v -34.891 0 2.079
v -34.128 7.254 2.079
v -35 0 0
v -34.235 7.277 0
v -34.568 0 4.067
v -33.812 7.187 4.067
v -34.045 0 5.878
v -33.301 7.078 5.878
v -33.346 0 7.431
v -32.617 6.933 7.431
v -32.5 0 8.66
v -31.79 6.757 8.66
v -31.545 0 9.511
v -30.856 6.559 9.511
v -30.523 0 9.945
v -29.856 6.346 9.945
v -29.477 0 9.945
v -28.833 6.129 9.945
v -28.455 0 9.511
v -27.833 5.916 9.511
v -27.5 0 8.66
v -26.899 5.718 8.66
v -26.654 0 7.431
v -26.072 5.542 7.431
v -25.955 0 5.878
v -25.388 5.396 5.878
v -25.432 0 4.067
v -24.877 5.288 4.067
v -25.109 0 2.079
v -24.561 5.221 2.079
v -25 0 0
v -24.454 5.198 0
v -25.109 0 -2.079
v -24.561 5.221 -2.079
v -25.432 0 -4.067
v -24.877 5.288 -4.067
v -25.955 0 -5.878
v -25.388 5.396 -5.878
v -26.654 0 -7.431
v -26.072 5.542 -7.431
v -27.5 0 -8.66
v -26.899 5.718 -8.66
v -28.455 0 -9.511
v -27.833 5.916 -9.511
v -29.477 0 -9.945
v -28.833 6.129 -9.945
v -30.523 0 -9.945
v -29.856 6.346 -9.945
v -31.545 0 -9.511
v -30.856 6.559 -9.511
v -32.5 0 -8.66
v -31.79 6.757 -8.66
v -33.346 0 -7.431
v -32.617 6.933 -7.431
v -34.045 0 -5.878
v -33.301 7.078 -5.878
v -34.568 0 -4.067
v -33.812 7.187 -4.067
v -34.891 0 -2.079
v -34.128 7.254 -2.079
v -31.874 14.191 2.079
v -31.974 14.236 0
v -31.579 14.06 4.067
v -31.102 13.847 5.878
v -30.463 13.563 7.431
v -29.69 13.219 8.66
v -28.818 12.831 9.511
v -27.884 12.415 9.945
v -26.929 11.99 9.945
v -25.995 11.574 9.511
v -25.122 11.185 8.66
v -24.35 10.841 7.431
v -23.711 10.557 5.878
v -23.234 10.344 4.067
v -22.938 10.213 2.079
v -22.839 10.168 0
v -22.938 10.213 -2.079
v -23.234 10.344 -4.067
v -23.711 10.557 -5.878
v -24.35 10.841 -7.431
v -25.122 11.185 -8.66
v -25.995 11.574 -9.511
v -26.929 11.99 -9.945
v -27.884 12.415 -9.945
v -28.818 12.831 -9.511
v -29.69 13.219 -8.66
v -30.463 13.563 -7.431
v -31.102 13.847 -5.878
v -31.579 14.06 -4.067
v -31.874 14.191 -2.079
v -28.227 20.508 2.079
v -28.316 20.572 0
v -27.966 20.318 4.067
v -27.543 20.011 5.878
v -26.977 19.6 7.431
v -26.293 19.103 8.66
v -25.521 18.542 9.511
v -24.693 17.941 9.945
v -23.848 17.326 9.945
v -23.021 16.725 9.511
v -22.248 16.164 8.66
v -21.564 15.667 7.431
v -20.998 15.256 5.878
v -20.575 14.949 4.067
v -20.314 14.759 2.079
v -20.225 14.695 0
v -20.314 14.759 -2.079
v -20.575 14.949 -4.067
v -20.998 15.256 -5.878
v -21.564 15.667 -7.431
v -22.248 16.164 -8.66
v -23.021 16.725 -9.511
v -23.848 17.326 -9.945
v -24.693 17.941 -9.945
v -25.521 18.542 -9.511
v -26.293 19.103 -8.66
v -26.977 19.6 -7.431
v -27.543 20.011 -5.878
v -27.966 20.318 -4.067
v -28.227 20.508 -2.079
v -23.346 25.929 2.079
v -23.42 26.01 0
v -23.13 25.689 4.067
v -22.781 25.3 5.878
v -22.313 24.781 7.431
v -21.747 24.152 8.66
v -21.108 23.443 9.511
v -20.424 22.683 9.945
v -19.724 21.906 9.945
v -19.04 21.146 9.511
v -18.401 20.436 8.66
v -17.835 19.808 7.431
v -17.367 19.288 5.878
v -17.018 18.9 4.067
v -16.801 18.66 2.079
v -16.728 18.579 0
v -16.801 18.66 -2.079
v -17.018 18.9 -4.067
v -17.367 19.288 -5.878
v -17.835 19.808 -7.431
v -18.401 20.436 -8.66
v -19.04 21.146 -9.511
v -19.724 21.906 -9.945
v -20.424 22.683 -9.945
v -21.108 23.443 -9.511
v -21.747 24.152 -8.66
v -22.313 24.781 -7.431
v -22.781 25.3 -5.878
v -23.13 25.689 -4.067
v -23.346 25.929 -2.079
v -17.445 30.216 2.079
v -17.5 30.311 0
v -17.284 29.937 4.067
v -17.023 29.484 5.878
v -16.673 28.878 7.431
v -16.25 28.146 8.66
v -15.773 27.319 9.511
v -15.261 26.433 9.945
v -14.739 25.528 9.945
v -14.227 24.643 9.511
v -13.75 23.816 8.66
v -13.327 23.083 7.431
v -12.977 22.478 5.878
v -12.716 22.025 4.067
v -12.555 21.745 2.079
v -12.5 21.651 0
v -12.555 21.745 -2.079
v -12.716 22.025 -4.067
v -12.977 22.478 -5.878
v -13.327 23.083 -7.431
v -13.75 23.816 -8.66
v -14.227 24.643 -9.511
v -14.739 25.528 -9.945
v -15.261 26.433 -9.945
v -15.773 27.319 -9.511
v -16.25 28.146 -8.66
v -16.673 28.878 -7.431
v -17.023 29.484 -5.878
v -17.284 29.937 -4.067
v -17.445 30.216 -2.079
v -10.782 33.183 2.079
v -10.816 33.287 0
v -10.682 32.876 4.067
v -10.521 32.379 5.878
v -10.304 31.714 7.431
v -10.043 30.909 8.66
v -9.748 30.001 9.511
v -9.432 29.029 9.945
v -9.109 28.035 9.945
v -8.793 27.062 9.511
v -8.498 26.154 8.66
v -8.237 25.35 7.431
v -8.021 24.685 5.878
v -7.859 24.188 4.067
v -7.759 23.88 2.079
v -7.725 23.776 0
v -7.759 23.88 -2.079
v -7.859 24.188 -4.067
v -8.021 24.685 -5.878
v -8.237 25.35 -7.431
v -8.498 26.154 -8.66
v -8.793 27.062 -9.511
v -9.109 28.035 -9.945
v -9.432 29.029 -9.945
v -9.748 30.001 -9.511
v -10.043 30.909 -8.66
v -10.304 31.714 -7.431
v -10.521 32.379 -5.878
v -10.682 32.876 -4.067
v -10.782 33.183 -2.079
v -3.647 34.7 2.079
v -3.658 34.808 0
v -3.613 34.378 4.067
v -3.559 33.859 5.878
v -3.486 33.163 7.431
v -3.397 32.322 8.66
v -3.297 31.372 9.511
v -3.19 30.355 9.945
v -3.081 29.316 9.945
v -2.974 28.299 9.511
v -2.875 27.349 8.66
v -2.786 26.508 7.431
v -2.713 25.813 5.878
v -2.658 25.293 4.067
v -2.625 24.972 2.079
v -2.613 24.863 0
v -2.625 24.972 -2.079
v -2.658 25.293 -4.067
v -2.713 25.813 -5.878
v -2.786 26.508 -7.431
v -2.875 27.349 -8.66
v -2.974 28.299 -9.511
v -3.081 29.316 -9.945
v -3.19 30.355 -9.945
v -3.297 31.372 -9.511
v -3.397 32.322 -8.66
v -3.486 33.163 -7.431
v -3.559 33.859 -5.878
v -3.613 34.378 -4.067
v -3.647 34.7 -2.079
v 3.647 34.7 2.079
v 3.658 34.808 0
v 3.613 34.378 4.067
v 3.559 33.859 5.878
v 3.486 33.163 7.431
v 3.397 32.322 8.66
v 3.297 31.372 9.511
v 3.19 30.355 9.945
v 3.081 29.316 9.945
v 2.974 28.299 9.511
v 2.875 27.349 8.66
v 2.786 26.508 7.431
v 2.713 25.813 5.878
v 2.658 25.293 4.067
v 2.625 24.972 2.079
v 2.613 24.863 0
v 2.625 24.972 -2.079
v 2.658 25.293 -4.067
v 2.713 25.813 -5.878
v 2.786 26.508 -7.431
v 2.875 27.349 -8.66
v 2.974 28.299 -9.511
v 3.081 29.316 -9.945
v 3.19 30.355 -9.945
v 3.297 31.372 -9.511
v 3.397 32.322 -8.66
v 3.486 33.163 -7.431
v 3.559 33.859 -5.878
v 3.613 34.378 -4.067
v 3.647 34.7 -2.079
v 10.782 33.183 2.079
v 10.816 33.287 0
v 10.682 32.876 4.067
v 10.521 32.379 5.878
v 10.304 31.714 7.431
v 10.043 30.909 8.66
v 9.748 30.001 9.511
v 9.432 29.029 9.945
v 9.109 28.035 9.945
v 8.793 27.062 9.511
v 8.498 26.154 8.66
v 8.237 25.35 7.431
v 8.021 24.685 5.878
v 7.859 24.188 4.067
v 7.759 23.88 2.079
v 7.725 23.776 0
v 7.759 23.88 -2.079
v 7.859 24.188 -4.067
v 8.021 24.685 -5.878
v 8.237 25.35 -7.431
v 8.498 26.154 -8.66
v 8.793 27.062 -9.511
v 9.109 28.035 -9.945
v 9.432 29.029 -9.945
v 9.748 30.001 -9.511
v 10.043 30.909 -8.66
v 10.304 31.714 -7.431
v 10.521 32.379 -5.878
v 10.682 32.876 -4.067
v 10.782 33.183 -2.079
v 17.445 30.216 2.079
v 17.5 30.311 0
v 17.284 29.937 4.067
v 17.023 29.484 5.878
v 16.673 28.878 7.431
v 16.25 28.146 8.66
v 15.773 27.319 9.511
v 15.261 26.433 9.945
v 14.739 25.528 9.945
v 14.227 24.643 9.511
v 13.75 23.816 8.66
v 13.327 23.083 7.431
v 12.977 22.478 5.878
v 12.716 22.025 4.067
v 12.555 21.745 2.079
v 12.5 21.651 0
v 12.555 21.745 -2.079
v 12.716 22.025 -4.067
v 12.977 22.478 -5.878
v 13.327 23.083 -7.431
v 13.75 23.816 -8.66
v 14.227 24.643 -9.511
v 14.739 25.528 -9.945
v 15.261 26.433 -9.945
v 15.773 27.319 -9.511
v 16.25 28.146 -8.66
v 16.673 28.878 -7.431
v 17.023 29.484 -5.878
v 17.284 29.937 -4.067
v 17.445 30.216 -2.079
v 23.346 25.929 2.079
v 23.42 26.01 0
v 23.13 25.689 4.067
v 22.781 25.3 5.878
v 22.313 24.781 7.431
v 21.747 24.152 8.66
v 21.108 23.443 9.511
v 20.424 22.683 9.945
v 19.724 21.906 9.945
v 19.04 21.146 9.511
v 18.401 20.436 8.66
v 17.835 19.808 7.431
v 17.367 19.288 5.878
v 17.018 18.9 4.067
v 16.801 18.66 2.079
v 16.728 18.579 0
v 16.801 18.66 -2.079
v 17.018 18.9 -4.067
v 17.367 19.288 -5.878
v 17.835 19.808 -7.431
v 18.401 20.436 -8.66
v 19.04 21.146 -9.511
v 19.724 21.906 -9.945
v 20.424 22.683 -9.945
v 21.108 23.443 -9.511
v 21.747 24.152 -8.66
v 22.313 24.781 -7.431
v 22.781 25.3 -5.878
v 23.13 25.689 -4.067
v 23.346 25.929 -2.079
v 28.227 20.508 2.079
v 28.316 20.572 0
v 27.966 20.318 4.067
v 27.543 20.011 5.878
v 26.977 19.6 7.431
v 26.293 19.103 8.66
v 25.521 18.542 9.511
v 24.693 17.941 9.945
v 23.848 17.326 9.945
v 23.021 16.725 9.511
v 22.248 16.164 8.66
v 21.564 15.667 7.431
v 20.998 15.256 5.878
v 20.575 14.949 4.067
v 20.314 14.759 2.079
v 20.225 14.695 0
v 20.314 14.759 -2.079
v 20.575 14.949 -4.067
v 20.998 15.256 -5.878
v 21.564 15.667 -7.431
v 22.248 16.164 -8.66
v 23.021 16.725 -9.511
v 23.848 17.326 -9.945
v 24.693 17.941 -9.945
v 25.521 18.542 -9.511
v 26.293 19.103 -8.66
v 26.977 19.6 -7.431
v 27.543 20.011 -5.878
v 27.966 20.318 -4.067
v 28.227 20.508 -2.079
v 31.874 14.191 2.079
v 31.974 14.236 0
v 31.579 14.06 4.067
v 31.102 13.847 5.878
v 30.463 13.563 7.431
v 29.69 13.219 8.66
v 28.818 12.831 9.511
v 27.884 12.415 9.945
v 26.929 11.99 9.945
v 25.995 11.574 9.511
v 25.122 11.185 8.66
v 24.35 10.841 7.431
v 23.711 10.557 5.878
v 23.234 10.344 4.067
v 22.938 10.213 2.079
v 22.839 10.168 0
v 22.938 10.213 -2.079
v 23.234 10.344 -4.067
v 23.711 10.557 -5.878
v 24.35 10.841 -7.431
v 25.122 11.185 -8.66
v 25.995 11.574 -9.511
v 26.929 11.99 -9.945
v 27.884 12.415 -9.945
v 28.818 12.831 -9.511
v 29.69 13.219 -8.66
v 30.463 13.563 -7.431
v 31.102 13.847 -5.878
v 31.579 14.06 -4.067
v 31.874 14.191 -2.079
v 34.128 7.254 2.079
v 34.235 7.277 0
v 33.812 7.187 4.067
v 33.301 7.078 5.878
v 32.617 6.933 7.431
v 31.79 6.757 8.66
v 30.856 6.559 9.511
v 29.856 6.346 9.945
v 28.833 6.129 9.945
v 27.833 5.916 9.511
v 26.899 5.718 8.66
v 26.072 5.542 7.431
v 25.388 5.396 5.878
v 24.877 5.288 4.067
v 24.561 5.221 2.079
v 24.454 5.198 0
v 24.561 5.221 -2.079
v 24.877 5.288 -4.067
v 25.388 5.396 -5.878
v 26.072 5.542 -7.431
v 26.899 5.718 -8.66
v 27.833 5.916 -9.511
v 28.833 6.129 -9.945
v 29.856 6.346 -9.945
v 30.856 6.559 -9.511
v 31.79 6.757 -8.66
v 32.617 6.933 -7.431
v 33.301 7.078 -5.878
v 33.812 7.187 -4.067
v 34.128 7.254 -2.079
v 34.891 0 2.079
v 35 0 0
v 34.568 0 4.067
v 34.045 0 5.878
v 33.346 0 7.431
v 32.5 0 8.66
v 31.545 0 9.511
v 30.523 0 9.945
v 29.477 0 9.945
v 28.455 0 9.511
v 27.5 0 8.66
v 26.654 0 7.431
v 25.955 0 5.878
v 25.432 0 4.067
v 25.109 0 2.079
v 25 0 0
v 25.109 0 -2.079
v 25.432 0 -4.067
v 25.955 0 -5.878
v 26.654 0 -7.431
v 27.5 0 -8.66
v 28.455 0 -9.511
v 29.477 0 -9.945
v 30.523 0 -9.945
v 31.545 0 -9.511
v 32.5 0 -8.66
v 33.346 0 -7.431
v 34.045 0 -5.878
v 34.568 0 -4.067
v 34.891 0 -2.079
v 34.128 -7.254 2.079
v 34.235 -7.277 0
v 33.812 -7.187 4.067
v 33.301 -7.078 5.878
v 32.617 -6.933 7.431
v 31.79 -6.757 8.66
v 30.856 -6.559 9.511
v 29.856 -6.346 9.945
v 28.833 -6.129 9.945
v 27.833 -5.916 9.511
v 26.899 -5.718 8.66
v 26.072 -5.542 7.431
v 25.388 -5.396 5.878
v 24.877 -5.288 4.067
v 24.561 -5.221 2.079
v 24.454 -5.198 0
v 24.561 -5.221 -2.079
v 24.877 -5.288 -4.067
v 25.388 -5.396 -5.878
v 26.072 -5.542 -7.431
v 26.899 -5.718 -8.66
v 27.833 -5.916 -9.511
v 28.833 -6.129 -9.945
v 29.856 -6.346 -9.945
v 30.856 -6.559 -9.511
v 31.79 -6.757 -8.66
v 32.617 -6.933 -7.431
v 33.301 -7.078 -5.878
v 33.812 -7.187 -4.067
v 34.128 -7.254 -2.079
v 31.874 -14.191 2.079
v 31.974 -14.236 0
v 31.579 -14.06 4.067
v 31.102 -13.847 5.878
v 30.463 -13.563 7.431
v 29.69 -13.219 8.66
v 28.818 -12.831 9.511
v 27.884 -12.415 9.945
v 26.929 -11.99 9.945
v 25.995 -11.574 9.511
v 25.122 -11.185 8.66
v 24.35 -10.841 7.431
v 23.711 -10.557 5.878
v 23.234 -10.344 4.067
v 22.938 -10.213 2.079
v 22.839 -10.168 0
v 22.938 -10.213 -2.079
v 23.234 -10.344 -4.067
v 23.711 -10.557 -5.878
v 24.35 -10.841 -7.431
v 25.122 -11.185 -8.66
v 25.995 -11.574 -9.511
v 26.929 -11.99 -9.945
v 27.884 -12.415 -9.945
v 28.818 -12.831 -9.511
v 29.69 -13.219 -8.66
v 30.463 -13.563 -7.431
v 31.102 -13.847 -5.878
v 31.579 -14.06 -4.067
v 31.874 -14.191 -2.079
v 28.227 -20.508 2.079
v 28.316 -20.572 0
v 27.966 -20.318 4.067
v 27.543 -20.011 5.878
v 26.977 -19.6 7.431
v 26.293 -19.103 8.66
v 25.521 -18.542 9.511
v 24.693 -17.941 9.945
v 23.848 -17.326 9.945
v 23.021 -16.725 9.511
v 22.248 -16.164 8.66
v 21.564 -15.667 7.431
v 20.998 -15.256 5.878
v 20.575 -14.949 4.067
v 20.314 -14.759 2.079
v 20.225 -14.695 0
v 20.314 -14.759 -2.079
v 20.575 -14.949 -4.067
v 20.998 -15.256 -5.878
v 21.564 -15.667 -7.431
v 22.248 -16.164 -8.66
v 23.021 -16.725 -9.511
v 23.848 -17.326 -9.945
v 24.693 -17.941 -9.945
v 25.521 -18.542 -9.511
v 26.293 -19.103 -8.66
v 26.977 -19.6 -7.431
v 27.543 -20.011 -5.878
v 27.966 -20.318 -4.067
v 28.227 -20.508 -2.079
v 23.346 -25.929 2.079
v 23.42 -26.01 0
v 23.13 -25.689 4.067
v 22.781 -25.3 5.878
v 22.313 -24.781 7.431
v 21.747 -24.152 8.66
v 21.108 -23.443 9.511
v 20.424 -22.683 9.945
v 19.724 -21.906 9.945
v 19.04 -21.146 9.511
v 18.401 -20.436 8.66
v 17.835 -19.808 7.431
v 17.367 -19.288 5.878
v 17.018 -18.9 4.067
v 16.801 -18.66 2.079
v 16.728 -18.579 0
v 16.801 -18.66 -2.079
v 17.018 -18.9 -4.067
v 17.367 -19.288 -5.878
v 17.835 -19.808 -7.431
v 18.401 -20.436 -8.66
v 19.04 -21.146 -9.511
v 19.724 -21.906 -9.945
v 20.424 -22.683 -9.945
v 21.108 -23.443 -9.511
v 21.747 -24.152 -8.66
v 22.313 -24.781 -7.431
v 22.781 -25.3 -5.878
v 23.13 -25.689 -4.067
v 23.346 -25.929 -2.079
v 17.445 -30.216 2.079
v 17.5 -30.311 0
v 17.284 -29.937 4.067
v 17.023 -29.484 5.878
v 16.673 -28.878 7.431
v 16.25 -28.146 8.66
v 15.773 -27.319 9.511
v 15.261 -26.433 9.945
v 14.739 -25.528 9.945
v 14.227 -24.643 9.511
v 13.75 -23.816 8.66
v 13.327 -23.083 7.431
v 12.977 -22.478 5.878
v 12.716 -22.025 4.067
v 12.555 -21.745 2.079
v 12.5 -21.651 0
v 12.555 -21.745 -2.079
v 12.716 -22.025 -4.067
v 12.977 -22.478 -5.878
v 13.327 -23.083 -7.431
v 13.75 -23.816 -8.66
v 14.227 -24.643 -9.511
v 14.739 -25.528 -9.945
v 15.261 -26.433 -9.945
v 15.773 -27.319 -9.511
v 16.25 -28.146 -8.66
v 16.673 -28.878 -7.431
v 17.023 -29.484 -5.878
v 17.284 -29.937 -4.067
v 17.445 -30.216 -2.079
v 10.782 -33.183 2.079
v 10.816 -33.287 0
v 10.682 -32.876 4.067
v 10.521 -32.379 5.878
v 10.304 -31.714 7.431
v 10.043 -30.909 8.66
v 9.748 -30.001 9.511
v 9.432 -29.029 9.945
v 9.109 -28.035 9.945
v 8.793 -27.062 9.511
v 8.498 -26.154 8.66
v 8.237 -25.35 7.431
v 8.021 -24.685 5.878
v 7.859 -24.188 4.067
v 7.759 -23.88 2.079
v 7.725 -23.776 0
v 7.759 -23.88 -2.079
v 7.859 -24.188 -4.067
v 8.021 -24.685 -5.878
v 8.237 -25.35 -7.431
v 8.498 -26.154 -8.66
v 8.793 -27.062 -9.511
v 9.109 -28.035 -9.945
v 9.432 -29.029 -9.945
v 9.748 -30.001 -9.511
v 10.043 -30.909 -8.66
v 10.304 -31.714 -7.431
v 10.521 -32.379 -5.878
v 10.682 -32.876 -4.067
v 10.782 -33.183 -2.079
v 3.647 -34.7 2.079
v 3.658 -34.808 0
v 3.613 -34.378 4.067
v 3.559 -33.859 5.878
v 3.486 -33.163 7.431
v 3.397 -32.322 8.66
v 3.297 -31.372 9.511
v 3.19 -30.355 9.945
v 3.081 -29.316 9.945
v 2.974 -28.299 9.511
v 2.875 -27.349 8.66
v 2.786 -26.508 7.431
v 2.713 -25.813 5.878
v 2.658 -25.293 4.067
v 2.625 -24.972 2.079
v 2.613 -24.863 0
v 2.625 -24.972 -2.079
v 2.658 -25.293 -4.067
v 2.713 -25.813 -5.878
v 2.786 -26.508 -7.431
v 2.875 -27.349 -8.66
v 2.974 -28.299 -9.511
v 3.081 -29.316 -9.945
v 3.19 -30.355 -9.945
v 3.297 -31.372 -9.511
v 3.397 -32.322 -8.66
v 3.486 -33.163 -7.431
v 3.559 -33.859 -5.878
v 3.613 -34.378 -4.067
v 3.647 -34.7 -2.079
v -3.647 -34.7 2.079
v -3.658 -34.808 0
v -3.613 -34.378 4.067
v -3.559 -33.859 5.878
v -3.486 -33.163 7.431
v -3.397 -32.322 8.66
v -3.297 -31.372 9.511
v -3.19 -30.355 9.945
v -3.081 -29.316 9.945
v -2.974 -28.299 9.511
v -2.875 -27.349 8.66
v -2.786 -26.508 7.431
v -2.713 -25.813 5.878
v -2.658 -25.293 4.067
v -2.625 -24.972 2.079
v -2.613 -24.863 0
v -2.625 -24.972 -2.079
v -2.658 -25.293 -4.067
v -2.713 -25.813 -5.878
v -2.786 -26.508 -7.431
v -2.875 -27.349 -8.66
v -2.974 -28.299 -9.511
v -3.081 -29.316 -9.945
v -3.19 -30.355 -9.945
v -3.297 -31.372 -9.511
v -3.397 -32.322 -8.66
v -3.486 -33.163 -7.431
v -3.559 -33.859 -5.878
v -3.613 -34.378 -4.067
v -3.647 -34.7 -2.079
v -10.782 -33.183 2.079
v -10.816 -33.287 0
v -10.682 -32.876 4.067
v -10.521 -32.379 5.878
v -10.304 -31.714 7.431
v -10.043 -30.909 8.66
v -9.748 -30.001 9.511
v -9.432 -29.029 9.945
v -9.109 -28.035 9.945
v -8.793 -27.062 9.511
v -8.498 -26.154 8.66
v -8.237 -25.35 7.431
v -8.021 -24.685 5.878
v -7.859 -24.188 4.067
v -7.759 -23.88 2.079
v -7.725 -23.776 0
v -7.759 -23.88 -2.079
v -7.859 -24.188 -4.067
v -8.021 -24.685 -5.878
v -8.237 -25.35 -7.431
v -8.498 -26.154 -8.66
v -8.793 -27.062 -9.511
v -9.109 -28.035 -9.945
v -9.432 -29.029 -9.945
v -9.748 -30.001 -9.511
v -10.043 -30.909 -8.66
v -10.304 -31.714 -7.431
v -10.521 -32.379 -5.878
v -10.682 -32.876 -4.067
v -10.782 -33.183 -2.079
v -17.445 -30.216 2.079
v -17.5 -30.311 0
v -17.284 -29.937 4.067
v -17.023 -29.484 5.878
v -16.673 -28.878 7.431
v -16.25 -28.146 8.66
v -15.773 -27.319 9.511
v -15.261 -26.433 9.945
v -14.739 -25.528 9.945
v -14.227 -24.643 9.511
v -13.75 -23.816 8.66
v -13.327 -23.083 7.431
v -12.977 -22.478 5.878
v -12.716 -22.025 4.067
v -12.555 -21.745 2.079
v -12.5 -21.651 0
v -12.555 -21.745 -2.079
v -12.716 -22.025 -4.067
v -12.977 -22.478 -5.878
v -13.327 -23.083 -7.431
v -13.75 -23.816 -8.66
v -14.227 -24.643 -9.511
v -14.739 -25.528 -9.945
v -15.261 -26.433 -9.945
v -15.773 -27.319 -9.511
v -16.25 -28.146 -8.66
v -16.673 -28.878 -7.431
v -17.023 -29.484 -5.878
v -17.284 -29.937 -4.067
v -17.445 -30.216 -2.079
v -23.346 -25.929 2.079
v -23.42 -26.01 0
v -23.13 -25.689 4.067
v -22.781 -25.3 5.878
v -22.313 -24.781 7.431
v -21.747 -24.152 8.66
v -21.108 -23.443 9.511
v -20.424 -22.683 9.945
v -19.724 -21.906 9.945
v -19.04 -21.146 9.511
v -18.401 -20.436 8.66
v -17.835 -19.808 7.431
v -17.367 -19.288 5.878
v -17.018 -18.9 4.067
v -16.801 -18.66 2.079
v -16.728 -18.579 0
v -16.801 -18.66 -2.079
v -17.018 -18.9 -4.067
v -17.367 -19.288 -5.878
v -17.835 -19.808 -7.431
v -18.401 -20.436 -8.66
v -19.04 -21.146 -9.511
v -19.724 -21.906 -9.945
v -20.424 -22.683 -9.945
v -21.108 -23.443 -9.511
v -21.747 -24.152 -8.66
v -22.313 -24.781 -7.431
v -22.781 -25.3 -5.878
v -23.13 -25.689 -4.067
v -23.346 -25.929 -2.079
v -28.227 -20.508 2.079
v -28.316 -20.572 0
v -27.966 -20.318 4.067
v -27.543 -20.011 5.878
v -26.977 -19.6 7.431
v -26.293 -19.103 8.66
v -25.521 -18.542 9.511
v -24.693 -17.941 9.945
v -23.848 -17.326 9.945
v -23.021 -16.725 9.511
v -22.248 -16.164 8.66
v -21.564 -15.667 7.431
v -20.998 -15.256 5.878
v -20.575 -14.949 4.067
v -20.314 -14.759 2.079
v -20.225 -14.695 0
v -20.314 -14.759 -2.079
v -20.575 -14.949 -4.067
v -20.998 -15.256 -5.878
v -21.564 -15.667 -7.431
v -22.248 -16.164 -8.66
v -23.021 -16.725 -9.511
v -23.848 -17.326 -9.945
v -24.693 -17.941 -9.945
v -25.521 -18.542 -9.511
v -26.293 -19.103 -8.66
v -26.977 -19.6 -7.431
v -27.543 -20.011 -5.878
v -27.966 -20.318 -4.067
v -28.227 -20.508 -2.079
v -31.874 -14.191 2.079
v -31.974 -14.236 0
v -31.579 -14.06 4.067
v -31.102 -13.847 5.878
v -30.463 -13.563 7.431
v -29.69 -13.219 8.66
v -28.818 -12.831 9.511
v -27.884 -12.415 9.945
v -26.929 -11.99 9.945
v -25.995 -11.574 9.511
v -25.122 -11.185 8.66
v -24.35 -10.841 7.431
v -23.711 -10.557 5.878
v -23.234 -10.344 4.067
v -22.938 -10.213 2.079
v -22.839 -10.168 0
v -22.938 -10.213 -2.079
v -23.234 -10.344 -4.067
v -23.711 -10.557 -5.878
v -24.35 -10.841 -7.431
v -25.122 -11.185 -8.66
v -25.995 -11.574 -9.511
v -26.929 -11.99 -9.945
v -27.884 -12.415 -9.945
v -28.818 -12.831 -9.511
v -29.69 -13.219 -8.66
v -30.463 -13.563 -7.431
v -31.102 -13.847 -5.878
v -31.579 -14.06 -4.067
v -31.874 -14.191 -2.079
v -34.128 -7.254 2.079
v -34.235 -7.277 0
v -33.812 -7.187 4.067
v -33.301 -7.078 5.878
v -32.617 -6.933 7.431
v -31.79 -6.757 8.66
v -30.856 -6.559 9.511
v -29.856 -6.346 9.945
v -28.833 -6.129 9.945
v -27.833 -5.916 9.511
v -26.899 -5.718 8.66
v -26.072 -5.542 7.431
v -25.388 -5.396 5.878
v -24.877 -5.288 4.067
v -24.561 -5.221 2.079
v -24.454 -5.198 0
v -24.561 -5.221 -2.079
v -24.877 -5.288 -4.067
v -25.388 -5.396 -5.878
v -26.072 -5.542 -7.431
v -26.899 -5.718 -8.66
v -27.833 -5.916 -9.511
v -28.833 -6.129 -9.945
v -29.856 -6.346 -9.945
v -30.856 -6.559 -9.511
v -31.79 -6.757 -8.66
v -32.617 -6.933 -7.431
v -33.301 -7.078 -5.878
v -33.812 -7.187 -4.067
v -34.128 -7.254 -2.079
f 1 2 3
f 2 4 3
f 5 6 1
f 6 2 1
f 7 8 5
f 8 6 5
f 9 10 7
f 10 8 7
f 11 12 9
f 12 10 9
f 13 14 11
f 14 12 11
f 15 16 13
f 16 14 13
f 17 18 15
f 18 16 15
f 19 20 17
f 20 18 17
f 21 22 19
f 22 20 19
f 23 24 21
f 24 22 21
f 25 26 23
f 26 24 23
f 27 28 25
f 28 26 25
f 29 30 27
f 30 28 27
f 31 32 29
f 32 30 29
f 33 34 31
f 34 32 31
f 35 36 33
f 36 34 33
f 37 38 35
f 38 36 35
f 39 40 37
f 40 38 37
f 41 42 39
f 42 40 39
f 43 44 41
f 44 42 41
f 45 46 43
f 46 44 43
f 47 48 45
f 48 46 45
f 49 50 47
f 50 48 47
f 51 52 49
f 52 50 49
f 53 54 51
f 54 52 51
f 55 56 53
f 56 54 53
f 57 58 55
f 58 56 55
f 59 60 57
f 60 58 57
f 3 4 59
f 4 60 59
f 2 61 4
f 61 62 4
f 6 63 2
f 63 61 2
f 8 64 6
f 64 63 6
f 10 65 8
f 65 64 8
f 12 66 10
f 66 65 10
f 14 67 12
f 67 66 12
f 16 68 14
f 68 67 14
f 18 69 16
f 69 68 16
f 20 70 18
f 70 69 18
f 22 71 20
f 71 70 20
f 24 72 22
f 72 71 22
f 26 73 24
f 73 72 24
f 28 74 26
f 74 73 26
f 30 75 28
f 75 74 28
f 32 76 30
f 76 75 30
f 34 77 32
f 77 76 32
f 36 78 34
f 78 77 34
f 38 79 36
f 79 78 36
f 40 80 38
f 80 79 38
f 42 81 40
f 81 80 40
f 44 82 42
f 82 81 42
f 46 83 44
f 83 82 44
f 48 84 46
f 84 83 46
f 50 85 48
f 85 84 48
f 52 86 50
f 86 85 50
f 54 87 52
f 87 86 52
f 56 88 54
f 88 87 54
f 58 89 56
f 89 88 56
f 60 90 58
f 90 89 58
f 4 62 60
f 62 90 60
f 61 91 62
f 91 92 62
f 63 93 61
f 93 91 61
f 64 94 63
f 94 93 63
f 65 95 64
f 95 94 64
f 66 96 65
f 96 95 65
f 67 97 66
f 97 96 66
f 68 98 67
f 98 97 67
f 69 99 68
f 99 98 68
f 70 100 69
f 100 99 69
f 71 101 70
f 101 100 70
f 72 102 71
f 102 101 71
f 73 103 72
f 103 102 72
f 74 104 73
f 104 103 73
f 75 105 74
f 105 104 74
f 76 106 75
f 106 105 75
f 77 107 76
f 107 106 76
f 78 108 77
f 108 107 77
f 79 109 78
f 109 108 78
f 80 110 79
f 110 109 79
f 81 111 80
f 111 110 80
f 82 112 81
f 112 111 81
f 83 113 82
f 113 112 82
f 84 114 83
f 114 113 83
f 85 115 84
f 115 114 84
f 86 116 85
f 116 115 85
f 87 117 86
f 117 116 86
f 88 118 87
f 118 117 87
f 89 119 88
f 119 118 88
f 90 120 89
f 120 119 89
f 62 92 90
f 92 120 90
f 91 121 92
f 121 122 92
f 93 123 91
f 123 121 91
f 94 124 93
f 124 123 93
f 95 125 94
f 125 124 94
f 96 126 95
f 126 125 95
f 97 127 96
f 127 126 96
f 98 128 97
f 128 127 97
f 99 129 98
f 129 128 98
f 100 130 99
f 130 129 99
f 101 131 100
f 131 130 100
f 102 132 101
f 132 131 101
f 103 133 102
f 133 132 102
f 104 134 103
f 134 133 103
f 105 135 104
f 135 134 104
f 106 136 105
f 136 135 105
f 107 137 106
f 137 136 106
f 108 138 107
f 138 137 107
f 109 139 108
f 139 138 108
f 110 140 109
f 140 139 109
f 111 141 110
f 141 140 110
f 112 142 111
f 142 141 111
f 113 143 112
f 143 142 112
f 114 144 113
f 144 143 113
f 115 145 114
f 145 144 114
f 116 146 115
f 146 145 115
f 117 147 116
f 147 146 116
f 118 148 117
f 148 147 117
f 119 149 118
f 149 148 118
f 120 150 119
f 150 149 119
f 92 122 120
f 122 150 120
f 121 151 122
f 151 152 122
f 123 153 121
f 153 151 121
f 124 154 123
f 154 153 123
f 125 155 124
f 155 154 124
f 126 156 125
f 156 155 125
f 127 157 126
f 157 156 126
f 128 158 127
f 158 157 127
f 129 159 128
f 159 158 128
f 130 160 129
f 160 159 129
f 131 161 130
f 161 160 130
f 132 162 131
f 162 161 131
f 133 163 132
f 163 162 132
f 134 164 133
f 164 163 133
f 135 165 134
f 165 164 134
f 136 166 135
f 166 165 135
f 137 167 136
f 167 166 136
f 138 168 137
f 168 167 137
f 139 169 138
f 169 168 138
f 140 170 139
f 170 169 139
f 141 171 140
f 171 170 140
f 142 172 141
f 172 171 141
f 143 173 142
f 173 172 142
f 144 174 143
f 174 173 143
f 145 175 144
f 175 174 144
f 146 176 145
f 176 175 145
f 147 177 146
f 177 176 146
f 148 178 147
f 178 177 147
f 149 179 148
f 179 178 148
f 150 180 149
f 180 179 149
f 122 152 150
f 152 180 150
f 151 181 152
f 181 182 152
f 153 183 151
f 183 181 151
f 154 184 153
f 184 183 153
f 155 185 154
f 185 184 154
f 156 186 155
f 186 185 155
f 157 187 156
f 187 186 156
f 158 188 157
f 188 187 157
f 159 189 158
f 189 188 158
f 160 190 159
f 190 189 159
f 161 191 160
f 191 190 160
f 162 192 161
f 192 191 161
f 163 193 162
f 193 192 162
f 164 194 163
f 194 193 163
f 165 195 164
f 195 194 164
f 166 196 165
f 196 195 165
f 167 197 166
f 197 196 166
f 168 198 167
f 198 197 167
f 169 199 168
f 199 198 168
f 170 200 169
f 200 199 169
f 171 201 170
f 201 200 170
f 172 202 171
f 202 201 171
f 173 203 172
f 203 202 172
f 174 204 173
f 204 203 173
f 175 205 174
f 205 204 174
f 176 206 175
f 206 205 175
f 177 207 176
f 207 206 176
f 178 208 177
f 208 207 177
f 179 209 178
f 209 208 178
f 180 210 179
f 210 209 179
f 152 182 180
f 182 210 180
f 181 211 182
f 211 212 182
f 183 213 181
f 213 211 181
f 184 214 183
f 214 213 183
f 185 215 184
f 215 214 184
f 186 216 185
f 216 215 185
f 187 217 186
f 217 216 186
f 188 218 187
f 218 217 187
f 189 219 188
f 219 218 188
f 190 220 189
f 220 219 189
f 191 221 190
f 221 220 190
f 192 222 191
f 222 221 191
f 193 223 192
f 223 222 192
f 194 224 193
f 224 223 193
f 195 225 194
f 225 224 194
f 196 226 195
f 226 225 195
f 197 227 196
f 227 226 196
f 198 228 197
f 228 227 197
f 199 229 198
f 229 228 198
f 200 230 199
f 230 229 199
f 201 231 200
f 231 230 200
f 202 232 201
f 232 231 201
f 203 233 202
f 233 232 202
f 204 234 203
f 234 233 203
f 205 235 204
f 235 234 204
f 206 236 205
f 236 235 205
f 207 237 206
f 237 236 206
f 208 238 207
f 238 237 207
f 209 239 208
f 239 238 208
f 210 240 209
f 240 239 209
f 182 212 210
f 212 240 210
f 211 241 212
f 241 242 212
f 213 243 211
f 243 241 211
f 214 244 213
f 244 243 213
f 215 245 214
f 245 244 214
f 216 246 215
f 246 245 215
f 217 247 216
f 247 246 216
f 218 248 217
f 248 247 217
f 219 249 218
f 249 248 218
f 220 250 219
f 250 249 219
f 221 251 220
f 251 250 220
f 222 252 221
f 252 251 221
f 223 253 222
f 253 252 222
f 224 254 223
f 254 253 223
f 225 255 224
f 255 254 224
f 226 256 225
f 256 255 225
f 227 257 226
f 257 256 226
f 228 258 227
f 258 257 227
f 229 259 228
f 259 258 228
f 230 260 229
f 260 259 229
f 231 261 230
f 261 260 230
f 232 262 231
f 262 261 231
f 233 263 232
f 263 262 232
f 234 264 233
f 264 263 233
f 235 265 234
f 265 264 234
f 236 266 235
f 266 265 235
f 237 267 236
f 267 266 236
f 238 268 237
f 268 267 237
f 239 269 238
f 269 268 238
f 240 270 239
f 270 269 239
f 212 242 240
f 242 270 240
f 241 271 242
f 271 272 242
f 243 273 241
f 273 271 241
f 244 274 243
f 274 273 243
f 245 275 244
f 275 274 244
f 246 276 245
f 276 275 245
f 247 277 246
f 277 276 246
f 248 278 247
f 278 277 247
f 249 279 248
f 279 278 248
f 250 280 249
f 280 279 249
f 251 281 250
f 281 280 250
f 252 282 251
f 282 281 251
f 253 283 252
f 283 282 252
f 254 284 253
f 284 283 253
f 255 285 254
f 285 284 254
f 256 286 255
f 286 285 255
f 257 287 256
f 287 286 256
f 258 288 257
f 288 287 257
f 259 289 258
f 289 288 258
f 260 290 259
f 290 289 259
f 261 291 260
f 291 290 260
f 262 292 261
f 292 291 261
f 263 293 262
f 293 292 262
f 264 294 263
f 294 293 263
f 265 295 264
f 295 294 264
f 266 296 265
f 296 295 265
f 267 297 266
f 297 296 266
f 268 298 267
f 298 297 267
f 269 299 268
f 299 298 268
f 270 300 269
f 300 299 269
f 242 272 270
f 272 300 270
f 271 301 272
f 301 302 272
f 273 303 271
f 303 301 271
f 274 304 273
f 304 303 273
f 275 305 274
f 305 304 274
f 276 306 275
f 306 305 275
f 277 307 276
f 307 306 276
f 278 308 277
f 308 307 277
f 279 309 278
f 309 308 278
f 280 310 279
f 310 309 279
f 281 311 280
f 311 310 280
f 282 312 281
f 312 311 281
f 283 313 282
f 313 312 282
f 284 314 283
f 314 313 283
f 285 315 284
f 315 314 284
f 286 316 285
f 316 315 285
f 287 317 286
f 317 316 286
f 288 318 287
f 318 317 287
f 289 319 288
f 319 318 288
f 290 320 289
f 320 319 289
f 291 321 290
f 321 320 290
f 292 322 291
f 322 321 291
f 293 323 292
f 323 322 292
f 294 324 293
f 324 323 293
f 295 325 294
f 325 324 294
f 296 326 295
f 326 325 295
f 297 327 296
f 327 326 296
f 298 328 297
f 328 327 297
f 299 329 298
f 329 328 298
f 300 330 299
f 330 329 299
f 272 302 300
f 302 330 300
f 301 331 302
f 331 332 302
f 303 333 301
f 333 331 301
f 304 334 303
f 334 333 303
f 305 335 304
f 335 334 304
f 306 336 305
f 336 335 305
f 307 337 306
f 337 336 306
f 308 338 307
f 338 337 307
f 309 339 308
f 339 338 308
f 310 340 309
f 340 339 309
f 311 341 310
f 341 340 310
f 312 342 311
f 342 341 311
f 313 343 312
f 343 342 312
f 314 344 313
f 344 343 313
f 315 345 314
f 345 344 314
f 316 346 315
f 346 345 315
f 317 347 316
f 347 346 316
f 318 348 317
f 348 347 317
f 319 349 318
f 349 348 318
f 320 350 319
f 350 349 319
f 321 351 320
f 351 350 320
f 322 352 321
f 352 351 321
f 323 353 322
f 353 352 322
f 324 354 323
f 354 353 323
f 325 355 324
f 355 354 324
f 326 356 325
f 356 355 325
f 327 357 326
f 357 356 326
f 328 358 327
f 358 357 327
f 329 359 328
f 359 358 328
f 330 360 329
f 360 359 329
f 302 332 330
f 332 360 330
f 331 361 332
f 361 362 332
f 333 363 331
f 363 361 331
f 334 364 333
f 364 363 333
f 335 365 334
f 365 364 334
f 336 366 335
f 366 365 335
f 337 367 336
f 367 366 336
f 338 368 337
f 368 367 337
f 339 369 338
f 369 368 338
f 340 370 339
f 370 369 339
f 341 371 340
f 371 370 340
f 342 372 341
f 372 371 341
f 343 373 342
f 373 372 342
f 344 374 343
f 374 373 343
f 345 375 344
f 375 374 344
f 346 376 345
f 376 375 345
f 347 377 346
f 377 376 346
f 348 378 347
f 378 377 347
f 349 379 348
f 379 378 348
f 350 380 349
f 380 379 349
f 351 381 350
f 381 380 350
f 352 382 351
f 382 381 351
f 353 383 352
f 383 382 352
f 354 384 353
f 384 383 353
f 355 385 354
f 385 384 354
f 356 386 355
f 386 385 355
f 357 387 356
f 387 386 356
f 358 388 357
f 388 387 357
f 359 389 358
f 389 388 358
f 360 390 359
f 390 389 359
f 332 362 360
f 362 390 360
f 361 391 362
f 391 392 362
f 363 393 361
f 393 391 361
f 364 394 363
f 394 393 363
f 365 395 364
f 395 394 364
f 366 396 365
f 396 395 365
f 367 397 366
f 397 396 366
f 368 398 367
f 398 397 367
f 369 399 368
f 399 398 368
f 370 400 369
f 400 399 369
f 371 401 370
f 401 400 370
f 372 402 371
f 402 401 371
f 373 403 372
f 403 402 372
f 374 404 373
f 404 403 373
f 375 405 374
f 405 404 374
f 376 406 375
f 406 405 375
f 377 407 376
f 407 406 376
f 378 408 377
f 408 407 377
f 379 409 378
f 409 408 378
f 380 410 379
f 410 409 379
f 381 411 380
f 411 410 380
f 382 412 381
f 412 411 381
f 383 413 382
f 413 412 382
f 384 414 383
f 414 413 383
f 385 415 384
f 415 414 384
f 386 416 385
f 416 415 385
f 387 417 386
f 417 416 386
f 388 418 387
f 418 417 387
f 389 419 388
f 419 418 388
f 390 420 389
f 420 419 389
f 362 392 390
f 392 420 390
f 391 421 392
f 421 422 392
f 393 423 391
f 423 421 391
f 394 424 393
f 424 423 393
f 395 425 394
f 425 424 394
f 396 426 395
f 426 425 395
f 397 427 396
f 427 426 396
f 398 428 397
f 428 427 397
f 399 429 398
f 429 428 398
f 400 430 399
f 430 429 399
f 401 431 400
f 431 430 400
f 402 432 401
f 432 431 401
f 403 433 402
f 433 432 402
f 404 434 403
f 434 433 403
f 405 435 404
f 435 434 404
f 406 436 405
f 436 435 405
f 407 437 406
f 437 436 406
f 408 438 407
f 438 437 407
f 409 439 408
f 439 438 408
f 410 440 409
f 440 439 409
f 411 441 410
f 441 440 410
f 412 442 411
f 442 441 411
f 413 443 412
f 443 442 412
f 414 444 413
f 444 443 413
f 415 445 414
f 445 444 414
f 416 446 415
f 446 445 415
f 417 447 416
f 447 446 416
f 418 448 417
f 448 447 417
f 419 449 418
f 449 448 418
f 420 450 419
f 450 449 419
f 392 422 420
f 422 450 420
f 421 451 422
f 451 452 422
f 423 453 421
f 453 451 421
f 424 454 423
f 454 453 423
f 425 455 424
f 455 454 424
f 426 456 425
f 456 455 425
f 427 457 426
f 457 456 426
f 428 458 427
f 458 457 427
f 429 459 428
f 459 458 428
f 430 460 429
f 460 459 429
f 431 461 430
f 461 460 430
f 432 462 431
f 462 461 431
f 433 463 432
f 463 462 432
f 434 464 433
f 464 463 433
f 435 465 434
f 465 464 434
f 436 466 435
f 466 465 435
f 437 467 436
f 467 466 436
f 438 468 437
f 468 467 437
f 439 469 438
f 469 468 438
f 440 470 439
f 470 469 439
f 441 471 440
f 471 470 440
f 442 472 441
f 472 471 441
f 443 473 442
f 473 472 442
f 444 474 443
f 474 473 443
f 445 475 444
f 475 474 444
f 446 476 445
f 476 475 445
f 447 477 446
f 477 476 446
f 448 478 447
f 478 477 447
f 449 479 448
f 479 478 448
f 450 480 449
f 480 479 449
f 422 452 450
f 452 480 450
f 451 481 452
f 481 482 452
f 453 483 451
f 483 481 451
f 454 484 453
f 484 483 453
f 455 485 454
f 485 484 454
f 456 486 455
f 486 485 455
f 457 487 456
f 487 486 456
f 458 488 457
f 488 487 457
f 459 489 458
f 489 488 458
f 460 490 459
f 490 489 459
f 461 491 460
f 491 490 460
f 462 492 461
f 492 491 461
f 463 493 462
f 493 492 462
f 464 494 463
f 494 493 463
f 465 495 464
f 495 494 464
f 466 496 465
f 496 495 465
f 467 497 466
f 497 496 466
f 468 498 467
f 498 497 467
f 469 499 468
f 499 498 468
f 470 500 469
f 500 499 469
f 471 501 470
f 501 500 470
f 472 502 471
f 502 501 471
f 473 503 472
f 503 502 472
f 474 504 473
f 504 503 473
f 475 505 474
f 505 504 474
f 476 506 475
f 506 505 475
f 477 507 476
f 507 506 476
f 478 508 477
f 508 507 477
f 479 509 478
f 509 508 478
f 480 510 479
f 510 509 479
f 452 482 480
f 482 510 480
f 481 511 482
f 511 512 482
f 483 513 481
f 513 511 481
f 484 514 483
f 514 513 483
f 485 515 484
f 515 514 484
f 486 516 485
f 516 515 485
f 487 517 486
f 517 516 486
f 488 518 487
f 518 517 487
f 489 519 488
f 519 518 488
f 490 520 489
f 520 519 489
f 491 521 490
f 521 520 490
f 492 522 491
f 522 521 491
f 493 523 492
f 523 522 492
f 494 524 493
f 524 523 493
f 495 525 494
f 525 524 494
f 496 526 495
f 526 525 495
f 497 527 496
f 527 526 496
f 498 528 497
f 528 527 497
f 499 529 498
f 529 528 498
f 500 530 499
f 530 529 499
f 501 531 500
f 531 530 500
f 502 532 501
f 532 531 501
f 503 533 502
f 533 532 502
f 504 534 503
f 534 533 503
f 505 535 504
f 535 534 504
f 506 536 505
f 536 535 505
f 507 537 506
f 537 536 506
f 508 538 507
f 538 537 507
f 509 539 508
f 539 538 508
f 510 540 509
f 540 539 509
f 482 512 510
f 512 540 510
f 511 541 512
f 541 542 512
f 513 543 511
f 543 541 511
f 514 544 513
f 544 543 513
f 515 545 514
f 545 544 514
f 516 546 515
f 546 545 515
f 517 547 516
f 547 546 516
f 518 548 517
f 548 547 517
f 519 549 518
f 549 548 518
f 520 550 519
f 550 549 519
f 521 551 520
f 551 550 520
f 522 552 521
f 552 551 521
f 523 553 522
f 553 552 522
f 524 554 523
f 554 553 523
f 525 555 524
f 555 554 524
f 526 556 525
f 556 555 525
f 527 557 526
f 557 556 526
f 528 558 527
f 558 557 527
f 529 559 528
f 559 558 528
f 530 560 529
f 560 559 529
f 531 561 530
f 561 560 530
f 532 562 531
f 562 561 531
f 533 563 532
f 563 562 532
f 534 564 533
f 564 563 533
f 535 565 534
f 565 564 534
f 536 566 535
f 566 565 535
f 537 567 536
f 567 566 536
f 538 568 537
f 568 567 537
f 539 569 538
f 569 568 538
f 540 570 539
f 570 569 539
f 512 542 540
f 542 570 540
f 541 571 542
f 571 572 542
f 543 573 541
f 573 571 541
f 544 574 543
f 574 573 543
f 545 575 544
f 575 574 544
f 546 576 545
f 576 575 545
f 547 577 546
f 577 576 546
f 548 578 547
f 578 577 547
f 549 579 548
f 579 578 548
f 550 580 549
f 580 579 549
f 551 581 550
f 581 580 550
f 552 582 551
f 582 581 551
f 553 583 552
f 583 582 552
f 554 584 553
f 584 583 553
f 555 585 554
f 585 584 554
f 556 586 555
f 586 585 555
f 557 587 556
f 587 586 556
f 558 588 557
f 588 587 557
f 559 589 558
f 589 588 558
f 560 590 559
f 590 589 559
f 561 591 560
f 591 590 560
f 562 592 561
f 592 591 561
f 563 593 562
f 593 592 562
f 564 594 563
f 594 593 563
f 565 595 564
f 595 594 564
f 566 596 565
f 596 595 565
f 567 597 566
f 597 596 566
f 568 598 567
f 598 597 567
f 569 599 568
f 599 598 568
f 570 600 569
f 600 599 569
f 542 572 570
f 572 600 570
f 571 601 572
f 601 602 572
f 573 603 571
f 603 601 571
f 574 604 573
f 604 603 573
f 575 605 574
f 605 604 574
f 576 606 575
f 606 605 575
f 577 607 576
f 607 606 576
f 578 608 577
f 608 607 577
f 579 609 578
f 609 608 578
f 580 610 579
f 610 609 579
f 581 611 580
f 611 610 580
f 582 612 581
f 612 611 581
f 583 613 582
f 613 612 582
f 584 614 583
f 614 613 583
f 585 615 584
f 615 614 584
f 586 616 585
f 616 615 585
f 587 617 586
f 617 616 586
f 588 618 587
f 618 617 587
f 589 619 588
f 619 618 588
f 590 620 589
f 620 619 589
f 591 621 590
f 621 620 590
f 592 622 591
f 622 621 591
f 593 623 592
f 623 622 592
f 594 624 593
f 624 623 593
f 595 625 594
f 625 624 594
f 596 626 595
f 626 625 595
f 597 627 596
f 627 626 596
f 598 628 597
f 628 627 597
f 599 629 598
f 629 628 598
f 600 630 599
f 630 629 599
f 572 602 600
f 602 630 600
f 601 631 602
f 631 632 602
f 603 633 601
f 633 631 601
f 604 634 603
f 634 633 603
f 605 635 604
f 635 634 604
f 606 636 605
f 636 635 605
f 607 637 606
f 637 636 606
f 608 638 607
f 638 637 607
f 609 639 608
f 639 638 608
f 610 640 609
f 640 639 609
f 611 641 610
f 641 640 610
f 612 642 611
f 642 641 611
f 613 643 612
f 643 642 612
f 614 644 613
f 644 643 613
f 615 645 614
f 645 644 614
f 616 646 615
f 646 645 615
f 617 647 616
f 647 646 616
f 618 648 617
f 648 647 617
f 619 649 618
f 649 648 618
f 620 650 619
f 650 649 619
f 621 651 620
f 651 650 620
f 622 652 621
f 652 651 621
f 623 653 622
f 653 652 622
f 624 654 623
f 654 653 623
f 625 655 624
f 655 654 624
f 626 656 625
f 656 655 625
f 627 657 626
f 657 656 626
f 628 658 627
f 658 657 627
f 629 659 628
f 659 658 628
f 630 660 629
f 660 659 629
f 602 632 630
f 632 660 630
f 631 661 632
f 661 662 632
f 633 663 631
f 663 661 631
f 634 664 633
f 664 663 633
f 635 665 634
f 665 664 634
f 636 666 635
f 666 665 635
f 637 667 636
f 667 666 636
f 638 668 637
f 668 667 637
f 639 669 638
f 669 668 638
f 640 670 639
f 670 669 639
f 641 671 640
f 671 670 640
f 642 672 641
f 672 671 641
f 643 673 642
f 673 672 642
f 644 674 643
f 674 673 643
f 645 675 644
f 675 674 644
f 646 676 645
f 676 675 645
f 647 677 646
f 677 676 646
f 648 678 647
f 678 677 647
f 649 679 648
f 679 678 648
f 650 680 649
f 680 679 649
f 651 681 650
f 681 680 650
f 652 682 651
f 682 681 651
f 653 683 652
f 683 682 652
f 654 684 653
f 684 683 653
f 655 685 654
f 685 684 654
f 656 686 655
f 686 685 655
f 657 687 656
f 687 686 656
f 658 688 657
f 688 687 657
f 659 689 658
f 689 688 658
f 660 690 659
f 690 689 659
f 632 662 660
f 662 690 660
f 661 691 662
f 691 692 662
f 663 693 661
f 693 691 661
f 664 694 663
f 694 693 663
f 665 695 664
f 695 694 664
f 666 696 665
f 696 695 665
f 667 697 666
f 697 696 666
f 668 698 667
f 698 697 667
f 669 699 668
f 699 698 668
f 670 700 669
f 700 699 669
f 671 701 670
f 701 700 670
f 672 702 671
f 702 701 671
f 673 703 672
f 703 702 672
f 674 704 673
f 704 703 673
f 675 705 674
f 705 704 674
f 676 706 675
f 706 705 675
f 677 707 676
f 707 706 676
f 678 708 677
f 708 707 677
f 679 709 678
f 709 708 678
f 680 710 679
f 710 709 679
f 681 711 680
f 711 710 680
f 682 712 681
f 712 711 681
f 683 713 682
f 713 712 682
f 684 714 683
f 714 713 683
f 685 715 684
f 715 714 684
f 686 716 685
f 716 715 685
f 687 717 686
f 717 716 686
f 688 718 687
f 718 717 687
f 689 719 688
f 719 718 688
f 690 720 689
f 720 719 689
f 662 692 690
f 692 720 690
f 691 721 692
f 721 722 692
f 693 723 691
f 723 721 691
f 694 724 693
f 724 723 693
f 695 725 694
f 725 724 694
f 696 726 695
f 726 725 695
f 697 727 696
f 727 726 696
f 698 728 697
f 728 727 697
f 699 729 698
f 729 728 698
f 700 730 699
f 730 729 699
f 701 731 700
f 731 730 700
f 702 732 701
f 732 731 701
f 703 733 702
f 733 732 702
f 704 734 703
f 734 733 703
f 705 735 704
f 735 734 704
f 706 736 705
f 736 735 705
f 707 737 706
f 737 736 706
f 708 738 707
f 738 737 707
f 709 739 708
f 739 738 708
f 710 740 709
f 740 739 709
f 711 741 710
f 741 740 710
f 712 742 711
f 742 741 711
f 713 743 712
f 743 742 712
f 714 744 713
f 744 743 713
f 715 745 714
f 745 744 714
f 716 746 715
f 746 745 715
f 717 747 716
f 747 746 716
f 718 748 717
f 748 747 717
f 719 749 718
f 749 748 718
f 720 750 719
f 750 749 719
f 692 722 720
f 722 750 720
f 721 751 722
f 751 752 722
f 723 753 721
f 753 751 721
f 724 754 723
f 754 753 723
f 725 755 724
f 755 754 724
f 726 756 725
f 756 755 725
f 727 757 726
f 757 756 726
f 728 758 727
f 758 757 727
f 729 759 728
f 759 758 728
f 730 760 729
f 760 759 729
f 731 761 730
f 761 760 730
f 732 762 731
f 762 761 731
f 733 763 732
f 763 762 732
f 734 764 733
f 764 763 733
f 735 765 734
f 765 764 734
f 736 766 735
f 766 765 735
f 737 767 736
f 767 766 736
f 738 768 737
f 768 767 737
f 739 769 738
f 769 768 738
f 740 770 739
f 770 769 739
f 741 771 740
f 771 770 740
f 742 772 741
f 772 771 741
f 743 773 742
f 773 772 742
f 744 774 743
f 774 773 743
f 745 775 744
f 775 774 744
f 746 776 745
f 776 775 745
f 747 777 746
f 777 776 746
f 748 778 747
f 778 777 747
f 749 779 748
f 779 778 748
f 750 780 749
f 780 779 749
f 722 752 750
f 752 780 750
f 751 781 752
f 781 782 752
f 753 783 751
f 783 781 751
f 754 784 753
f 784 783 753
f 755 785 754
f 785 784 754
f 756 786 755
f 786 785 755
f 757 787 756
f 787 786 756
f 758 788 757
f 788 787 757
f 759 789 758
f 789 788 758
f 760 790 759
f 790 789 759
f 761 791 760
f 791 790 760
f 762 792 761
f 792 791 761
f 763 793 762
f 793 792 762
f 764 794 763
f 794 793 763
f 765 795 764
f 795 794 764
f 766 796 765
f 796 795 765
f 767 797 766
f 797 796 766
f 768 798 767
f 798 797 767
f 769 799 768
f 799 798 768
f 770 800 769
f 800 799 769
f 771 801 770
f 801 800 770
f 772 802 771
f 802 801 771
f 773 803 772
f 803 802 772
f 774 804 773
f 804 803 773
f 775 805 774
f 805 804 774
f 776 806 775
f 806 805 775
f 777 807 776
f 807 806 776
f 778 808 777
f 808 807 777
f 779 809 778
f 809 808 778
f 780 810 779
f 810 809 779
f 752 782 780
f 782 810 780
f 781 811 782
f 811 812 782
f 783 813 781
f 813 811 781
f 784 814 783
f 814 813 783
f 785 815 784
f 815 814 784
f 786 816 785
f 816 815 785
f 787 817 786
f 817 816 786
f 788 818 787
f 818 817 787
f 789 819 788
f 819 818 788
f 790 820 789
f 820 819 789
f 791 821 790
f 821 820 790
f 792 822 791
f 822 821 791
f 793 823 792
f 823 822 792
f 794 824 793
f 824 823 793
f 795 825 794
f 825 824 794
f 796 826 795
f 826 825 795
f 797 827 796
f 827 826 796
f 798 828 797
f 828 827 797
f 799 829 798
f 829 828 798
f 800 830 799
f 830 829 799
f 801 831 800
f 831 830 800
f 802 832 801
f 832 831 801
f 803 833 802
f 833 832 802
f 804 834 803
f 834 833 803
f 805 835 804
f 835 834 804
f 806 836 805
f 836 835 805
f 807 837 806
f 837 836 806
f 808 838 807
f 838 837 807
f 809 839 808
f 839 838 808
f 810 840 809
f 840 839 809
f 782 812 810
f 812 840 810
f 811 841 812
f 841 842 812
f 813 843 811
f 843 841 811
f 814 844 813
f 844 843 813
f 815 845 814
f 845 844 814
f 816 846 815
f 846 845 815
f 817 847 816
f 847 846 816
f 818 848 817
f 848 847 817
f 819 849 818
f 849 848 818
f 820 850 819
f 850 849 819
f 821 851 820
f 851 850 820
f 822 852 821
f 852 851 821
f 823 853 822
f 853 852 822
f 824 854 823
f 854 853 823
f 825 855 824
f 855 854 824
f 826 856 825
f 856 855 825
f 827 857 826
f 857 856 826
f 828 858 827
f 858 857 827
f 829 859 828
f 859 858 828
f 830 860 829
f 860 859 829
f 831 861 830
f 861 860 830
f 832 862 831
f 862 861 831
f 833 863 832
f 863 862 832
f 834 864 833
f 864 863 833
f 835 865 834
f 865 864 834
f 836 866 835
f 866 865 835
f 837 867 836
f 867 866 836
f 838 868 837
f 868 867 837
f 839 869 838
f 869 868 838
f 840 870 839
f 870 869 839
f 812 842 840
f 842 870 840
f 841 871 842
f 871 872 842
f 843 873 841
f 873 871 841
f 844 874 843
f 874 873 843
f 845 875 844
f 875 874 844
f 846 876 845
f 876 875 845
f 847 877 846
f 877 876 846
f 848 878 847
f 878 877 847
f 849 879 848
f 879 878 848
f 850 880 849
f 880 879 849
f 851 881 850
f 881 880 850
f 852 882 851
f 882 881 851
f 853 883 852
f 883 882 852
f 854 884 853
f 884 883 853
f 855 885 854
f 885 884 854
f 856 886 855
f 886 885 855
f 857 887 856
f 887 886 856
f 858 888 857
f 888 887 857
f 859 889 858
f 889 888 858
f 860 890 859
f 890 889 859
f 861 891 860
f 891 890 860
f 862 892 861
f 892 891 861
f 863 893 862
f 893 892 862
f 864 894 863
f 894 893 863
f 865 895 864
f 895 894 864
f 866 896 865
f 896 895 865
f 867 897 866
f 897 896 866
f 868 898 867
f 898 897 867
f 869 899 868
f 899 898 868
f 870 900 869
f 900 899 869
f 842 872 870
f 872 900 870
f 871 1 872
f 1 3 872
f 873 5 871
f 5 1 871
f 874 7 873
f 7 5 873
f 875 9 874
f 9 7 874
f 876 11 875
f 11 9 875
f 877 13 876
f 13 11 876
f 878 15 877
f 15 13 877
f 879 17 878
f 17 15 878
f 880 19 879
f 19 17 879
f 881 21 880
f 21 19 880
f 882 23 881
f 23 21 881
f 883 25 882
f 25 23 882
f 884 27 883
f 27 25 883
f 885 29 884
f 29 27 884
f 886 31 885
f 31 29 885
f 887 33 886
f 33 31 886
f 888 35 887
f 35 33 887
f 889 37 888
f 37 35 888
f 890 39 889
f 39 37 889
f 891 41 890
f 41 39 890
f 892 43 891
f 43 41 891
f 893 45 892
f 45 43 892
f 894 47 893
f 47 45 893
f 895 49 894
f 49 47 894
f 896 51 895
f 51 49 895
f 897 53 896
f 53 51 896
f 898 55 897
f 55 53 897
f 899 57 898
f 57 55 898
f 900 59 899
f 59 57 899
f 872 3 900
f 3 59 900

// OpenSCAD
rotate_extrude() {
	translate([30, 0]) scale([.5, 1]) circle(r=10);
}
